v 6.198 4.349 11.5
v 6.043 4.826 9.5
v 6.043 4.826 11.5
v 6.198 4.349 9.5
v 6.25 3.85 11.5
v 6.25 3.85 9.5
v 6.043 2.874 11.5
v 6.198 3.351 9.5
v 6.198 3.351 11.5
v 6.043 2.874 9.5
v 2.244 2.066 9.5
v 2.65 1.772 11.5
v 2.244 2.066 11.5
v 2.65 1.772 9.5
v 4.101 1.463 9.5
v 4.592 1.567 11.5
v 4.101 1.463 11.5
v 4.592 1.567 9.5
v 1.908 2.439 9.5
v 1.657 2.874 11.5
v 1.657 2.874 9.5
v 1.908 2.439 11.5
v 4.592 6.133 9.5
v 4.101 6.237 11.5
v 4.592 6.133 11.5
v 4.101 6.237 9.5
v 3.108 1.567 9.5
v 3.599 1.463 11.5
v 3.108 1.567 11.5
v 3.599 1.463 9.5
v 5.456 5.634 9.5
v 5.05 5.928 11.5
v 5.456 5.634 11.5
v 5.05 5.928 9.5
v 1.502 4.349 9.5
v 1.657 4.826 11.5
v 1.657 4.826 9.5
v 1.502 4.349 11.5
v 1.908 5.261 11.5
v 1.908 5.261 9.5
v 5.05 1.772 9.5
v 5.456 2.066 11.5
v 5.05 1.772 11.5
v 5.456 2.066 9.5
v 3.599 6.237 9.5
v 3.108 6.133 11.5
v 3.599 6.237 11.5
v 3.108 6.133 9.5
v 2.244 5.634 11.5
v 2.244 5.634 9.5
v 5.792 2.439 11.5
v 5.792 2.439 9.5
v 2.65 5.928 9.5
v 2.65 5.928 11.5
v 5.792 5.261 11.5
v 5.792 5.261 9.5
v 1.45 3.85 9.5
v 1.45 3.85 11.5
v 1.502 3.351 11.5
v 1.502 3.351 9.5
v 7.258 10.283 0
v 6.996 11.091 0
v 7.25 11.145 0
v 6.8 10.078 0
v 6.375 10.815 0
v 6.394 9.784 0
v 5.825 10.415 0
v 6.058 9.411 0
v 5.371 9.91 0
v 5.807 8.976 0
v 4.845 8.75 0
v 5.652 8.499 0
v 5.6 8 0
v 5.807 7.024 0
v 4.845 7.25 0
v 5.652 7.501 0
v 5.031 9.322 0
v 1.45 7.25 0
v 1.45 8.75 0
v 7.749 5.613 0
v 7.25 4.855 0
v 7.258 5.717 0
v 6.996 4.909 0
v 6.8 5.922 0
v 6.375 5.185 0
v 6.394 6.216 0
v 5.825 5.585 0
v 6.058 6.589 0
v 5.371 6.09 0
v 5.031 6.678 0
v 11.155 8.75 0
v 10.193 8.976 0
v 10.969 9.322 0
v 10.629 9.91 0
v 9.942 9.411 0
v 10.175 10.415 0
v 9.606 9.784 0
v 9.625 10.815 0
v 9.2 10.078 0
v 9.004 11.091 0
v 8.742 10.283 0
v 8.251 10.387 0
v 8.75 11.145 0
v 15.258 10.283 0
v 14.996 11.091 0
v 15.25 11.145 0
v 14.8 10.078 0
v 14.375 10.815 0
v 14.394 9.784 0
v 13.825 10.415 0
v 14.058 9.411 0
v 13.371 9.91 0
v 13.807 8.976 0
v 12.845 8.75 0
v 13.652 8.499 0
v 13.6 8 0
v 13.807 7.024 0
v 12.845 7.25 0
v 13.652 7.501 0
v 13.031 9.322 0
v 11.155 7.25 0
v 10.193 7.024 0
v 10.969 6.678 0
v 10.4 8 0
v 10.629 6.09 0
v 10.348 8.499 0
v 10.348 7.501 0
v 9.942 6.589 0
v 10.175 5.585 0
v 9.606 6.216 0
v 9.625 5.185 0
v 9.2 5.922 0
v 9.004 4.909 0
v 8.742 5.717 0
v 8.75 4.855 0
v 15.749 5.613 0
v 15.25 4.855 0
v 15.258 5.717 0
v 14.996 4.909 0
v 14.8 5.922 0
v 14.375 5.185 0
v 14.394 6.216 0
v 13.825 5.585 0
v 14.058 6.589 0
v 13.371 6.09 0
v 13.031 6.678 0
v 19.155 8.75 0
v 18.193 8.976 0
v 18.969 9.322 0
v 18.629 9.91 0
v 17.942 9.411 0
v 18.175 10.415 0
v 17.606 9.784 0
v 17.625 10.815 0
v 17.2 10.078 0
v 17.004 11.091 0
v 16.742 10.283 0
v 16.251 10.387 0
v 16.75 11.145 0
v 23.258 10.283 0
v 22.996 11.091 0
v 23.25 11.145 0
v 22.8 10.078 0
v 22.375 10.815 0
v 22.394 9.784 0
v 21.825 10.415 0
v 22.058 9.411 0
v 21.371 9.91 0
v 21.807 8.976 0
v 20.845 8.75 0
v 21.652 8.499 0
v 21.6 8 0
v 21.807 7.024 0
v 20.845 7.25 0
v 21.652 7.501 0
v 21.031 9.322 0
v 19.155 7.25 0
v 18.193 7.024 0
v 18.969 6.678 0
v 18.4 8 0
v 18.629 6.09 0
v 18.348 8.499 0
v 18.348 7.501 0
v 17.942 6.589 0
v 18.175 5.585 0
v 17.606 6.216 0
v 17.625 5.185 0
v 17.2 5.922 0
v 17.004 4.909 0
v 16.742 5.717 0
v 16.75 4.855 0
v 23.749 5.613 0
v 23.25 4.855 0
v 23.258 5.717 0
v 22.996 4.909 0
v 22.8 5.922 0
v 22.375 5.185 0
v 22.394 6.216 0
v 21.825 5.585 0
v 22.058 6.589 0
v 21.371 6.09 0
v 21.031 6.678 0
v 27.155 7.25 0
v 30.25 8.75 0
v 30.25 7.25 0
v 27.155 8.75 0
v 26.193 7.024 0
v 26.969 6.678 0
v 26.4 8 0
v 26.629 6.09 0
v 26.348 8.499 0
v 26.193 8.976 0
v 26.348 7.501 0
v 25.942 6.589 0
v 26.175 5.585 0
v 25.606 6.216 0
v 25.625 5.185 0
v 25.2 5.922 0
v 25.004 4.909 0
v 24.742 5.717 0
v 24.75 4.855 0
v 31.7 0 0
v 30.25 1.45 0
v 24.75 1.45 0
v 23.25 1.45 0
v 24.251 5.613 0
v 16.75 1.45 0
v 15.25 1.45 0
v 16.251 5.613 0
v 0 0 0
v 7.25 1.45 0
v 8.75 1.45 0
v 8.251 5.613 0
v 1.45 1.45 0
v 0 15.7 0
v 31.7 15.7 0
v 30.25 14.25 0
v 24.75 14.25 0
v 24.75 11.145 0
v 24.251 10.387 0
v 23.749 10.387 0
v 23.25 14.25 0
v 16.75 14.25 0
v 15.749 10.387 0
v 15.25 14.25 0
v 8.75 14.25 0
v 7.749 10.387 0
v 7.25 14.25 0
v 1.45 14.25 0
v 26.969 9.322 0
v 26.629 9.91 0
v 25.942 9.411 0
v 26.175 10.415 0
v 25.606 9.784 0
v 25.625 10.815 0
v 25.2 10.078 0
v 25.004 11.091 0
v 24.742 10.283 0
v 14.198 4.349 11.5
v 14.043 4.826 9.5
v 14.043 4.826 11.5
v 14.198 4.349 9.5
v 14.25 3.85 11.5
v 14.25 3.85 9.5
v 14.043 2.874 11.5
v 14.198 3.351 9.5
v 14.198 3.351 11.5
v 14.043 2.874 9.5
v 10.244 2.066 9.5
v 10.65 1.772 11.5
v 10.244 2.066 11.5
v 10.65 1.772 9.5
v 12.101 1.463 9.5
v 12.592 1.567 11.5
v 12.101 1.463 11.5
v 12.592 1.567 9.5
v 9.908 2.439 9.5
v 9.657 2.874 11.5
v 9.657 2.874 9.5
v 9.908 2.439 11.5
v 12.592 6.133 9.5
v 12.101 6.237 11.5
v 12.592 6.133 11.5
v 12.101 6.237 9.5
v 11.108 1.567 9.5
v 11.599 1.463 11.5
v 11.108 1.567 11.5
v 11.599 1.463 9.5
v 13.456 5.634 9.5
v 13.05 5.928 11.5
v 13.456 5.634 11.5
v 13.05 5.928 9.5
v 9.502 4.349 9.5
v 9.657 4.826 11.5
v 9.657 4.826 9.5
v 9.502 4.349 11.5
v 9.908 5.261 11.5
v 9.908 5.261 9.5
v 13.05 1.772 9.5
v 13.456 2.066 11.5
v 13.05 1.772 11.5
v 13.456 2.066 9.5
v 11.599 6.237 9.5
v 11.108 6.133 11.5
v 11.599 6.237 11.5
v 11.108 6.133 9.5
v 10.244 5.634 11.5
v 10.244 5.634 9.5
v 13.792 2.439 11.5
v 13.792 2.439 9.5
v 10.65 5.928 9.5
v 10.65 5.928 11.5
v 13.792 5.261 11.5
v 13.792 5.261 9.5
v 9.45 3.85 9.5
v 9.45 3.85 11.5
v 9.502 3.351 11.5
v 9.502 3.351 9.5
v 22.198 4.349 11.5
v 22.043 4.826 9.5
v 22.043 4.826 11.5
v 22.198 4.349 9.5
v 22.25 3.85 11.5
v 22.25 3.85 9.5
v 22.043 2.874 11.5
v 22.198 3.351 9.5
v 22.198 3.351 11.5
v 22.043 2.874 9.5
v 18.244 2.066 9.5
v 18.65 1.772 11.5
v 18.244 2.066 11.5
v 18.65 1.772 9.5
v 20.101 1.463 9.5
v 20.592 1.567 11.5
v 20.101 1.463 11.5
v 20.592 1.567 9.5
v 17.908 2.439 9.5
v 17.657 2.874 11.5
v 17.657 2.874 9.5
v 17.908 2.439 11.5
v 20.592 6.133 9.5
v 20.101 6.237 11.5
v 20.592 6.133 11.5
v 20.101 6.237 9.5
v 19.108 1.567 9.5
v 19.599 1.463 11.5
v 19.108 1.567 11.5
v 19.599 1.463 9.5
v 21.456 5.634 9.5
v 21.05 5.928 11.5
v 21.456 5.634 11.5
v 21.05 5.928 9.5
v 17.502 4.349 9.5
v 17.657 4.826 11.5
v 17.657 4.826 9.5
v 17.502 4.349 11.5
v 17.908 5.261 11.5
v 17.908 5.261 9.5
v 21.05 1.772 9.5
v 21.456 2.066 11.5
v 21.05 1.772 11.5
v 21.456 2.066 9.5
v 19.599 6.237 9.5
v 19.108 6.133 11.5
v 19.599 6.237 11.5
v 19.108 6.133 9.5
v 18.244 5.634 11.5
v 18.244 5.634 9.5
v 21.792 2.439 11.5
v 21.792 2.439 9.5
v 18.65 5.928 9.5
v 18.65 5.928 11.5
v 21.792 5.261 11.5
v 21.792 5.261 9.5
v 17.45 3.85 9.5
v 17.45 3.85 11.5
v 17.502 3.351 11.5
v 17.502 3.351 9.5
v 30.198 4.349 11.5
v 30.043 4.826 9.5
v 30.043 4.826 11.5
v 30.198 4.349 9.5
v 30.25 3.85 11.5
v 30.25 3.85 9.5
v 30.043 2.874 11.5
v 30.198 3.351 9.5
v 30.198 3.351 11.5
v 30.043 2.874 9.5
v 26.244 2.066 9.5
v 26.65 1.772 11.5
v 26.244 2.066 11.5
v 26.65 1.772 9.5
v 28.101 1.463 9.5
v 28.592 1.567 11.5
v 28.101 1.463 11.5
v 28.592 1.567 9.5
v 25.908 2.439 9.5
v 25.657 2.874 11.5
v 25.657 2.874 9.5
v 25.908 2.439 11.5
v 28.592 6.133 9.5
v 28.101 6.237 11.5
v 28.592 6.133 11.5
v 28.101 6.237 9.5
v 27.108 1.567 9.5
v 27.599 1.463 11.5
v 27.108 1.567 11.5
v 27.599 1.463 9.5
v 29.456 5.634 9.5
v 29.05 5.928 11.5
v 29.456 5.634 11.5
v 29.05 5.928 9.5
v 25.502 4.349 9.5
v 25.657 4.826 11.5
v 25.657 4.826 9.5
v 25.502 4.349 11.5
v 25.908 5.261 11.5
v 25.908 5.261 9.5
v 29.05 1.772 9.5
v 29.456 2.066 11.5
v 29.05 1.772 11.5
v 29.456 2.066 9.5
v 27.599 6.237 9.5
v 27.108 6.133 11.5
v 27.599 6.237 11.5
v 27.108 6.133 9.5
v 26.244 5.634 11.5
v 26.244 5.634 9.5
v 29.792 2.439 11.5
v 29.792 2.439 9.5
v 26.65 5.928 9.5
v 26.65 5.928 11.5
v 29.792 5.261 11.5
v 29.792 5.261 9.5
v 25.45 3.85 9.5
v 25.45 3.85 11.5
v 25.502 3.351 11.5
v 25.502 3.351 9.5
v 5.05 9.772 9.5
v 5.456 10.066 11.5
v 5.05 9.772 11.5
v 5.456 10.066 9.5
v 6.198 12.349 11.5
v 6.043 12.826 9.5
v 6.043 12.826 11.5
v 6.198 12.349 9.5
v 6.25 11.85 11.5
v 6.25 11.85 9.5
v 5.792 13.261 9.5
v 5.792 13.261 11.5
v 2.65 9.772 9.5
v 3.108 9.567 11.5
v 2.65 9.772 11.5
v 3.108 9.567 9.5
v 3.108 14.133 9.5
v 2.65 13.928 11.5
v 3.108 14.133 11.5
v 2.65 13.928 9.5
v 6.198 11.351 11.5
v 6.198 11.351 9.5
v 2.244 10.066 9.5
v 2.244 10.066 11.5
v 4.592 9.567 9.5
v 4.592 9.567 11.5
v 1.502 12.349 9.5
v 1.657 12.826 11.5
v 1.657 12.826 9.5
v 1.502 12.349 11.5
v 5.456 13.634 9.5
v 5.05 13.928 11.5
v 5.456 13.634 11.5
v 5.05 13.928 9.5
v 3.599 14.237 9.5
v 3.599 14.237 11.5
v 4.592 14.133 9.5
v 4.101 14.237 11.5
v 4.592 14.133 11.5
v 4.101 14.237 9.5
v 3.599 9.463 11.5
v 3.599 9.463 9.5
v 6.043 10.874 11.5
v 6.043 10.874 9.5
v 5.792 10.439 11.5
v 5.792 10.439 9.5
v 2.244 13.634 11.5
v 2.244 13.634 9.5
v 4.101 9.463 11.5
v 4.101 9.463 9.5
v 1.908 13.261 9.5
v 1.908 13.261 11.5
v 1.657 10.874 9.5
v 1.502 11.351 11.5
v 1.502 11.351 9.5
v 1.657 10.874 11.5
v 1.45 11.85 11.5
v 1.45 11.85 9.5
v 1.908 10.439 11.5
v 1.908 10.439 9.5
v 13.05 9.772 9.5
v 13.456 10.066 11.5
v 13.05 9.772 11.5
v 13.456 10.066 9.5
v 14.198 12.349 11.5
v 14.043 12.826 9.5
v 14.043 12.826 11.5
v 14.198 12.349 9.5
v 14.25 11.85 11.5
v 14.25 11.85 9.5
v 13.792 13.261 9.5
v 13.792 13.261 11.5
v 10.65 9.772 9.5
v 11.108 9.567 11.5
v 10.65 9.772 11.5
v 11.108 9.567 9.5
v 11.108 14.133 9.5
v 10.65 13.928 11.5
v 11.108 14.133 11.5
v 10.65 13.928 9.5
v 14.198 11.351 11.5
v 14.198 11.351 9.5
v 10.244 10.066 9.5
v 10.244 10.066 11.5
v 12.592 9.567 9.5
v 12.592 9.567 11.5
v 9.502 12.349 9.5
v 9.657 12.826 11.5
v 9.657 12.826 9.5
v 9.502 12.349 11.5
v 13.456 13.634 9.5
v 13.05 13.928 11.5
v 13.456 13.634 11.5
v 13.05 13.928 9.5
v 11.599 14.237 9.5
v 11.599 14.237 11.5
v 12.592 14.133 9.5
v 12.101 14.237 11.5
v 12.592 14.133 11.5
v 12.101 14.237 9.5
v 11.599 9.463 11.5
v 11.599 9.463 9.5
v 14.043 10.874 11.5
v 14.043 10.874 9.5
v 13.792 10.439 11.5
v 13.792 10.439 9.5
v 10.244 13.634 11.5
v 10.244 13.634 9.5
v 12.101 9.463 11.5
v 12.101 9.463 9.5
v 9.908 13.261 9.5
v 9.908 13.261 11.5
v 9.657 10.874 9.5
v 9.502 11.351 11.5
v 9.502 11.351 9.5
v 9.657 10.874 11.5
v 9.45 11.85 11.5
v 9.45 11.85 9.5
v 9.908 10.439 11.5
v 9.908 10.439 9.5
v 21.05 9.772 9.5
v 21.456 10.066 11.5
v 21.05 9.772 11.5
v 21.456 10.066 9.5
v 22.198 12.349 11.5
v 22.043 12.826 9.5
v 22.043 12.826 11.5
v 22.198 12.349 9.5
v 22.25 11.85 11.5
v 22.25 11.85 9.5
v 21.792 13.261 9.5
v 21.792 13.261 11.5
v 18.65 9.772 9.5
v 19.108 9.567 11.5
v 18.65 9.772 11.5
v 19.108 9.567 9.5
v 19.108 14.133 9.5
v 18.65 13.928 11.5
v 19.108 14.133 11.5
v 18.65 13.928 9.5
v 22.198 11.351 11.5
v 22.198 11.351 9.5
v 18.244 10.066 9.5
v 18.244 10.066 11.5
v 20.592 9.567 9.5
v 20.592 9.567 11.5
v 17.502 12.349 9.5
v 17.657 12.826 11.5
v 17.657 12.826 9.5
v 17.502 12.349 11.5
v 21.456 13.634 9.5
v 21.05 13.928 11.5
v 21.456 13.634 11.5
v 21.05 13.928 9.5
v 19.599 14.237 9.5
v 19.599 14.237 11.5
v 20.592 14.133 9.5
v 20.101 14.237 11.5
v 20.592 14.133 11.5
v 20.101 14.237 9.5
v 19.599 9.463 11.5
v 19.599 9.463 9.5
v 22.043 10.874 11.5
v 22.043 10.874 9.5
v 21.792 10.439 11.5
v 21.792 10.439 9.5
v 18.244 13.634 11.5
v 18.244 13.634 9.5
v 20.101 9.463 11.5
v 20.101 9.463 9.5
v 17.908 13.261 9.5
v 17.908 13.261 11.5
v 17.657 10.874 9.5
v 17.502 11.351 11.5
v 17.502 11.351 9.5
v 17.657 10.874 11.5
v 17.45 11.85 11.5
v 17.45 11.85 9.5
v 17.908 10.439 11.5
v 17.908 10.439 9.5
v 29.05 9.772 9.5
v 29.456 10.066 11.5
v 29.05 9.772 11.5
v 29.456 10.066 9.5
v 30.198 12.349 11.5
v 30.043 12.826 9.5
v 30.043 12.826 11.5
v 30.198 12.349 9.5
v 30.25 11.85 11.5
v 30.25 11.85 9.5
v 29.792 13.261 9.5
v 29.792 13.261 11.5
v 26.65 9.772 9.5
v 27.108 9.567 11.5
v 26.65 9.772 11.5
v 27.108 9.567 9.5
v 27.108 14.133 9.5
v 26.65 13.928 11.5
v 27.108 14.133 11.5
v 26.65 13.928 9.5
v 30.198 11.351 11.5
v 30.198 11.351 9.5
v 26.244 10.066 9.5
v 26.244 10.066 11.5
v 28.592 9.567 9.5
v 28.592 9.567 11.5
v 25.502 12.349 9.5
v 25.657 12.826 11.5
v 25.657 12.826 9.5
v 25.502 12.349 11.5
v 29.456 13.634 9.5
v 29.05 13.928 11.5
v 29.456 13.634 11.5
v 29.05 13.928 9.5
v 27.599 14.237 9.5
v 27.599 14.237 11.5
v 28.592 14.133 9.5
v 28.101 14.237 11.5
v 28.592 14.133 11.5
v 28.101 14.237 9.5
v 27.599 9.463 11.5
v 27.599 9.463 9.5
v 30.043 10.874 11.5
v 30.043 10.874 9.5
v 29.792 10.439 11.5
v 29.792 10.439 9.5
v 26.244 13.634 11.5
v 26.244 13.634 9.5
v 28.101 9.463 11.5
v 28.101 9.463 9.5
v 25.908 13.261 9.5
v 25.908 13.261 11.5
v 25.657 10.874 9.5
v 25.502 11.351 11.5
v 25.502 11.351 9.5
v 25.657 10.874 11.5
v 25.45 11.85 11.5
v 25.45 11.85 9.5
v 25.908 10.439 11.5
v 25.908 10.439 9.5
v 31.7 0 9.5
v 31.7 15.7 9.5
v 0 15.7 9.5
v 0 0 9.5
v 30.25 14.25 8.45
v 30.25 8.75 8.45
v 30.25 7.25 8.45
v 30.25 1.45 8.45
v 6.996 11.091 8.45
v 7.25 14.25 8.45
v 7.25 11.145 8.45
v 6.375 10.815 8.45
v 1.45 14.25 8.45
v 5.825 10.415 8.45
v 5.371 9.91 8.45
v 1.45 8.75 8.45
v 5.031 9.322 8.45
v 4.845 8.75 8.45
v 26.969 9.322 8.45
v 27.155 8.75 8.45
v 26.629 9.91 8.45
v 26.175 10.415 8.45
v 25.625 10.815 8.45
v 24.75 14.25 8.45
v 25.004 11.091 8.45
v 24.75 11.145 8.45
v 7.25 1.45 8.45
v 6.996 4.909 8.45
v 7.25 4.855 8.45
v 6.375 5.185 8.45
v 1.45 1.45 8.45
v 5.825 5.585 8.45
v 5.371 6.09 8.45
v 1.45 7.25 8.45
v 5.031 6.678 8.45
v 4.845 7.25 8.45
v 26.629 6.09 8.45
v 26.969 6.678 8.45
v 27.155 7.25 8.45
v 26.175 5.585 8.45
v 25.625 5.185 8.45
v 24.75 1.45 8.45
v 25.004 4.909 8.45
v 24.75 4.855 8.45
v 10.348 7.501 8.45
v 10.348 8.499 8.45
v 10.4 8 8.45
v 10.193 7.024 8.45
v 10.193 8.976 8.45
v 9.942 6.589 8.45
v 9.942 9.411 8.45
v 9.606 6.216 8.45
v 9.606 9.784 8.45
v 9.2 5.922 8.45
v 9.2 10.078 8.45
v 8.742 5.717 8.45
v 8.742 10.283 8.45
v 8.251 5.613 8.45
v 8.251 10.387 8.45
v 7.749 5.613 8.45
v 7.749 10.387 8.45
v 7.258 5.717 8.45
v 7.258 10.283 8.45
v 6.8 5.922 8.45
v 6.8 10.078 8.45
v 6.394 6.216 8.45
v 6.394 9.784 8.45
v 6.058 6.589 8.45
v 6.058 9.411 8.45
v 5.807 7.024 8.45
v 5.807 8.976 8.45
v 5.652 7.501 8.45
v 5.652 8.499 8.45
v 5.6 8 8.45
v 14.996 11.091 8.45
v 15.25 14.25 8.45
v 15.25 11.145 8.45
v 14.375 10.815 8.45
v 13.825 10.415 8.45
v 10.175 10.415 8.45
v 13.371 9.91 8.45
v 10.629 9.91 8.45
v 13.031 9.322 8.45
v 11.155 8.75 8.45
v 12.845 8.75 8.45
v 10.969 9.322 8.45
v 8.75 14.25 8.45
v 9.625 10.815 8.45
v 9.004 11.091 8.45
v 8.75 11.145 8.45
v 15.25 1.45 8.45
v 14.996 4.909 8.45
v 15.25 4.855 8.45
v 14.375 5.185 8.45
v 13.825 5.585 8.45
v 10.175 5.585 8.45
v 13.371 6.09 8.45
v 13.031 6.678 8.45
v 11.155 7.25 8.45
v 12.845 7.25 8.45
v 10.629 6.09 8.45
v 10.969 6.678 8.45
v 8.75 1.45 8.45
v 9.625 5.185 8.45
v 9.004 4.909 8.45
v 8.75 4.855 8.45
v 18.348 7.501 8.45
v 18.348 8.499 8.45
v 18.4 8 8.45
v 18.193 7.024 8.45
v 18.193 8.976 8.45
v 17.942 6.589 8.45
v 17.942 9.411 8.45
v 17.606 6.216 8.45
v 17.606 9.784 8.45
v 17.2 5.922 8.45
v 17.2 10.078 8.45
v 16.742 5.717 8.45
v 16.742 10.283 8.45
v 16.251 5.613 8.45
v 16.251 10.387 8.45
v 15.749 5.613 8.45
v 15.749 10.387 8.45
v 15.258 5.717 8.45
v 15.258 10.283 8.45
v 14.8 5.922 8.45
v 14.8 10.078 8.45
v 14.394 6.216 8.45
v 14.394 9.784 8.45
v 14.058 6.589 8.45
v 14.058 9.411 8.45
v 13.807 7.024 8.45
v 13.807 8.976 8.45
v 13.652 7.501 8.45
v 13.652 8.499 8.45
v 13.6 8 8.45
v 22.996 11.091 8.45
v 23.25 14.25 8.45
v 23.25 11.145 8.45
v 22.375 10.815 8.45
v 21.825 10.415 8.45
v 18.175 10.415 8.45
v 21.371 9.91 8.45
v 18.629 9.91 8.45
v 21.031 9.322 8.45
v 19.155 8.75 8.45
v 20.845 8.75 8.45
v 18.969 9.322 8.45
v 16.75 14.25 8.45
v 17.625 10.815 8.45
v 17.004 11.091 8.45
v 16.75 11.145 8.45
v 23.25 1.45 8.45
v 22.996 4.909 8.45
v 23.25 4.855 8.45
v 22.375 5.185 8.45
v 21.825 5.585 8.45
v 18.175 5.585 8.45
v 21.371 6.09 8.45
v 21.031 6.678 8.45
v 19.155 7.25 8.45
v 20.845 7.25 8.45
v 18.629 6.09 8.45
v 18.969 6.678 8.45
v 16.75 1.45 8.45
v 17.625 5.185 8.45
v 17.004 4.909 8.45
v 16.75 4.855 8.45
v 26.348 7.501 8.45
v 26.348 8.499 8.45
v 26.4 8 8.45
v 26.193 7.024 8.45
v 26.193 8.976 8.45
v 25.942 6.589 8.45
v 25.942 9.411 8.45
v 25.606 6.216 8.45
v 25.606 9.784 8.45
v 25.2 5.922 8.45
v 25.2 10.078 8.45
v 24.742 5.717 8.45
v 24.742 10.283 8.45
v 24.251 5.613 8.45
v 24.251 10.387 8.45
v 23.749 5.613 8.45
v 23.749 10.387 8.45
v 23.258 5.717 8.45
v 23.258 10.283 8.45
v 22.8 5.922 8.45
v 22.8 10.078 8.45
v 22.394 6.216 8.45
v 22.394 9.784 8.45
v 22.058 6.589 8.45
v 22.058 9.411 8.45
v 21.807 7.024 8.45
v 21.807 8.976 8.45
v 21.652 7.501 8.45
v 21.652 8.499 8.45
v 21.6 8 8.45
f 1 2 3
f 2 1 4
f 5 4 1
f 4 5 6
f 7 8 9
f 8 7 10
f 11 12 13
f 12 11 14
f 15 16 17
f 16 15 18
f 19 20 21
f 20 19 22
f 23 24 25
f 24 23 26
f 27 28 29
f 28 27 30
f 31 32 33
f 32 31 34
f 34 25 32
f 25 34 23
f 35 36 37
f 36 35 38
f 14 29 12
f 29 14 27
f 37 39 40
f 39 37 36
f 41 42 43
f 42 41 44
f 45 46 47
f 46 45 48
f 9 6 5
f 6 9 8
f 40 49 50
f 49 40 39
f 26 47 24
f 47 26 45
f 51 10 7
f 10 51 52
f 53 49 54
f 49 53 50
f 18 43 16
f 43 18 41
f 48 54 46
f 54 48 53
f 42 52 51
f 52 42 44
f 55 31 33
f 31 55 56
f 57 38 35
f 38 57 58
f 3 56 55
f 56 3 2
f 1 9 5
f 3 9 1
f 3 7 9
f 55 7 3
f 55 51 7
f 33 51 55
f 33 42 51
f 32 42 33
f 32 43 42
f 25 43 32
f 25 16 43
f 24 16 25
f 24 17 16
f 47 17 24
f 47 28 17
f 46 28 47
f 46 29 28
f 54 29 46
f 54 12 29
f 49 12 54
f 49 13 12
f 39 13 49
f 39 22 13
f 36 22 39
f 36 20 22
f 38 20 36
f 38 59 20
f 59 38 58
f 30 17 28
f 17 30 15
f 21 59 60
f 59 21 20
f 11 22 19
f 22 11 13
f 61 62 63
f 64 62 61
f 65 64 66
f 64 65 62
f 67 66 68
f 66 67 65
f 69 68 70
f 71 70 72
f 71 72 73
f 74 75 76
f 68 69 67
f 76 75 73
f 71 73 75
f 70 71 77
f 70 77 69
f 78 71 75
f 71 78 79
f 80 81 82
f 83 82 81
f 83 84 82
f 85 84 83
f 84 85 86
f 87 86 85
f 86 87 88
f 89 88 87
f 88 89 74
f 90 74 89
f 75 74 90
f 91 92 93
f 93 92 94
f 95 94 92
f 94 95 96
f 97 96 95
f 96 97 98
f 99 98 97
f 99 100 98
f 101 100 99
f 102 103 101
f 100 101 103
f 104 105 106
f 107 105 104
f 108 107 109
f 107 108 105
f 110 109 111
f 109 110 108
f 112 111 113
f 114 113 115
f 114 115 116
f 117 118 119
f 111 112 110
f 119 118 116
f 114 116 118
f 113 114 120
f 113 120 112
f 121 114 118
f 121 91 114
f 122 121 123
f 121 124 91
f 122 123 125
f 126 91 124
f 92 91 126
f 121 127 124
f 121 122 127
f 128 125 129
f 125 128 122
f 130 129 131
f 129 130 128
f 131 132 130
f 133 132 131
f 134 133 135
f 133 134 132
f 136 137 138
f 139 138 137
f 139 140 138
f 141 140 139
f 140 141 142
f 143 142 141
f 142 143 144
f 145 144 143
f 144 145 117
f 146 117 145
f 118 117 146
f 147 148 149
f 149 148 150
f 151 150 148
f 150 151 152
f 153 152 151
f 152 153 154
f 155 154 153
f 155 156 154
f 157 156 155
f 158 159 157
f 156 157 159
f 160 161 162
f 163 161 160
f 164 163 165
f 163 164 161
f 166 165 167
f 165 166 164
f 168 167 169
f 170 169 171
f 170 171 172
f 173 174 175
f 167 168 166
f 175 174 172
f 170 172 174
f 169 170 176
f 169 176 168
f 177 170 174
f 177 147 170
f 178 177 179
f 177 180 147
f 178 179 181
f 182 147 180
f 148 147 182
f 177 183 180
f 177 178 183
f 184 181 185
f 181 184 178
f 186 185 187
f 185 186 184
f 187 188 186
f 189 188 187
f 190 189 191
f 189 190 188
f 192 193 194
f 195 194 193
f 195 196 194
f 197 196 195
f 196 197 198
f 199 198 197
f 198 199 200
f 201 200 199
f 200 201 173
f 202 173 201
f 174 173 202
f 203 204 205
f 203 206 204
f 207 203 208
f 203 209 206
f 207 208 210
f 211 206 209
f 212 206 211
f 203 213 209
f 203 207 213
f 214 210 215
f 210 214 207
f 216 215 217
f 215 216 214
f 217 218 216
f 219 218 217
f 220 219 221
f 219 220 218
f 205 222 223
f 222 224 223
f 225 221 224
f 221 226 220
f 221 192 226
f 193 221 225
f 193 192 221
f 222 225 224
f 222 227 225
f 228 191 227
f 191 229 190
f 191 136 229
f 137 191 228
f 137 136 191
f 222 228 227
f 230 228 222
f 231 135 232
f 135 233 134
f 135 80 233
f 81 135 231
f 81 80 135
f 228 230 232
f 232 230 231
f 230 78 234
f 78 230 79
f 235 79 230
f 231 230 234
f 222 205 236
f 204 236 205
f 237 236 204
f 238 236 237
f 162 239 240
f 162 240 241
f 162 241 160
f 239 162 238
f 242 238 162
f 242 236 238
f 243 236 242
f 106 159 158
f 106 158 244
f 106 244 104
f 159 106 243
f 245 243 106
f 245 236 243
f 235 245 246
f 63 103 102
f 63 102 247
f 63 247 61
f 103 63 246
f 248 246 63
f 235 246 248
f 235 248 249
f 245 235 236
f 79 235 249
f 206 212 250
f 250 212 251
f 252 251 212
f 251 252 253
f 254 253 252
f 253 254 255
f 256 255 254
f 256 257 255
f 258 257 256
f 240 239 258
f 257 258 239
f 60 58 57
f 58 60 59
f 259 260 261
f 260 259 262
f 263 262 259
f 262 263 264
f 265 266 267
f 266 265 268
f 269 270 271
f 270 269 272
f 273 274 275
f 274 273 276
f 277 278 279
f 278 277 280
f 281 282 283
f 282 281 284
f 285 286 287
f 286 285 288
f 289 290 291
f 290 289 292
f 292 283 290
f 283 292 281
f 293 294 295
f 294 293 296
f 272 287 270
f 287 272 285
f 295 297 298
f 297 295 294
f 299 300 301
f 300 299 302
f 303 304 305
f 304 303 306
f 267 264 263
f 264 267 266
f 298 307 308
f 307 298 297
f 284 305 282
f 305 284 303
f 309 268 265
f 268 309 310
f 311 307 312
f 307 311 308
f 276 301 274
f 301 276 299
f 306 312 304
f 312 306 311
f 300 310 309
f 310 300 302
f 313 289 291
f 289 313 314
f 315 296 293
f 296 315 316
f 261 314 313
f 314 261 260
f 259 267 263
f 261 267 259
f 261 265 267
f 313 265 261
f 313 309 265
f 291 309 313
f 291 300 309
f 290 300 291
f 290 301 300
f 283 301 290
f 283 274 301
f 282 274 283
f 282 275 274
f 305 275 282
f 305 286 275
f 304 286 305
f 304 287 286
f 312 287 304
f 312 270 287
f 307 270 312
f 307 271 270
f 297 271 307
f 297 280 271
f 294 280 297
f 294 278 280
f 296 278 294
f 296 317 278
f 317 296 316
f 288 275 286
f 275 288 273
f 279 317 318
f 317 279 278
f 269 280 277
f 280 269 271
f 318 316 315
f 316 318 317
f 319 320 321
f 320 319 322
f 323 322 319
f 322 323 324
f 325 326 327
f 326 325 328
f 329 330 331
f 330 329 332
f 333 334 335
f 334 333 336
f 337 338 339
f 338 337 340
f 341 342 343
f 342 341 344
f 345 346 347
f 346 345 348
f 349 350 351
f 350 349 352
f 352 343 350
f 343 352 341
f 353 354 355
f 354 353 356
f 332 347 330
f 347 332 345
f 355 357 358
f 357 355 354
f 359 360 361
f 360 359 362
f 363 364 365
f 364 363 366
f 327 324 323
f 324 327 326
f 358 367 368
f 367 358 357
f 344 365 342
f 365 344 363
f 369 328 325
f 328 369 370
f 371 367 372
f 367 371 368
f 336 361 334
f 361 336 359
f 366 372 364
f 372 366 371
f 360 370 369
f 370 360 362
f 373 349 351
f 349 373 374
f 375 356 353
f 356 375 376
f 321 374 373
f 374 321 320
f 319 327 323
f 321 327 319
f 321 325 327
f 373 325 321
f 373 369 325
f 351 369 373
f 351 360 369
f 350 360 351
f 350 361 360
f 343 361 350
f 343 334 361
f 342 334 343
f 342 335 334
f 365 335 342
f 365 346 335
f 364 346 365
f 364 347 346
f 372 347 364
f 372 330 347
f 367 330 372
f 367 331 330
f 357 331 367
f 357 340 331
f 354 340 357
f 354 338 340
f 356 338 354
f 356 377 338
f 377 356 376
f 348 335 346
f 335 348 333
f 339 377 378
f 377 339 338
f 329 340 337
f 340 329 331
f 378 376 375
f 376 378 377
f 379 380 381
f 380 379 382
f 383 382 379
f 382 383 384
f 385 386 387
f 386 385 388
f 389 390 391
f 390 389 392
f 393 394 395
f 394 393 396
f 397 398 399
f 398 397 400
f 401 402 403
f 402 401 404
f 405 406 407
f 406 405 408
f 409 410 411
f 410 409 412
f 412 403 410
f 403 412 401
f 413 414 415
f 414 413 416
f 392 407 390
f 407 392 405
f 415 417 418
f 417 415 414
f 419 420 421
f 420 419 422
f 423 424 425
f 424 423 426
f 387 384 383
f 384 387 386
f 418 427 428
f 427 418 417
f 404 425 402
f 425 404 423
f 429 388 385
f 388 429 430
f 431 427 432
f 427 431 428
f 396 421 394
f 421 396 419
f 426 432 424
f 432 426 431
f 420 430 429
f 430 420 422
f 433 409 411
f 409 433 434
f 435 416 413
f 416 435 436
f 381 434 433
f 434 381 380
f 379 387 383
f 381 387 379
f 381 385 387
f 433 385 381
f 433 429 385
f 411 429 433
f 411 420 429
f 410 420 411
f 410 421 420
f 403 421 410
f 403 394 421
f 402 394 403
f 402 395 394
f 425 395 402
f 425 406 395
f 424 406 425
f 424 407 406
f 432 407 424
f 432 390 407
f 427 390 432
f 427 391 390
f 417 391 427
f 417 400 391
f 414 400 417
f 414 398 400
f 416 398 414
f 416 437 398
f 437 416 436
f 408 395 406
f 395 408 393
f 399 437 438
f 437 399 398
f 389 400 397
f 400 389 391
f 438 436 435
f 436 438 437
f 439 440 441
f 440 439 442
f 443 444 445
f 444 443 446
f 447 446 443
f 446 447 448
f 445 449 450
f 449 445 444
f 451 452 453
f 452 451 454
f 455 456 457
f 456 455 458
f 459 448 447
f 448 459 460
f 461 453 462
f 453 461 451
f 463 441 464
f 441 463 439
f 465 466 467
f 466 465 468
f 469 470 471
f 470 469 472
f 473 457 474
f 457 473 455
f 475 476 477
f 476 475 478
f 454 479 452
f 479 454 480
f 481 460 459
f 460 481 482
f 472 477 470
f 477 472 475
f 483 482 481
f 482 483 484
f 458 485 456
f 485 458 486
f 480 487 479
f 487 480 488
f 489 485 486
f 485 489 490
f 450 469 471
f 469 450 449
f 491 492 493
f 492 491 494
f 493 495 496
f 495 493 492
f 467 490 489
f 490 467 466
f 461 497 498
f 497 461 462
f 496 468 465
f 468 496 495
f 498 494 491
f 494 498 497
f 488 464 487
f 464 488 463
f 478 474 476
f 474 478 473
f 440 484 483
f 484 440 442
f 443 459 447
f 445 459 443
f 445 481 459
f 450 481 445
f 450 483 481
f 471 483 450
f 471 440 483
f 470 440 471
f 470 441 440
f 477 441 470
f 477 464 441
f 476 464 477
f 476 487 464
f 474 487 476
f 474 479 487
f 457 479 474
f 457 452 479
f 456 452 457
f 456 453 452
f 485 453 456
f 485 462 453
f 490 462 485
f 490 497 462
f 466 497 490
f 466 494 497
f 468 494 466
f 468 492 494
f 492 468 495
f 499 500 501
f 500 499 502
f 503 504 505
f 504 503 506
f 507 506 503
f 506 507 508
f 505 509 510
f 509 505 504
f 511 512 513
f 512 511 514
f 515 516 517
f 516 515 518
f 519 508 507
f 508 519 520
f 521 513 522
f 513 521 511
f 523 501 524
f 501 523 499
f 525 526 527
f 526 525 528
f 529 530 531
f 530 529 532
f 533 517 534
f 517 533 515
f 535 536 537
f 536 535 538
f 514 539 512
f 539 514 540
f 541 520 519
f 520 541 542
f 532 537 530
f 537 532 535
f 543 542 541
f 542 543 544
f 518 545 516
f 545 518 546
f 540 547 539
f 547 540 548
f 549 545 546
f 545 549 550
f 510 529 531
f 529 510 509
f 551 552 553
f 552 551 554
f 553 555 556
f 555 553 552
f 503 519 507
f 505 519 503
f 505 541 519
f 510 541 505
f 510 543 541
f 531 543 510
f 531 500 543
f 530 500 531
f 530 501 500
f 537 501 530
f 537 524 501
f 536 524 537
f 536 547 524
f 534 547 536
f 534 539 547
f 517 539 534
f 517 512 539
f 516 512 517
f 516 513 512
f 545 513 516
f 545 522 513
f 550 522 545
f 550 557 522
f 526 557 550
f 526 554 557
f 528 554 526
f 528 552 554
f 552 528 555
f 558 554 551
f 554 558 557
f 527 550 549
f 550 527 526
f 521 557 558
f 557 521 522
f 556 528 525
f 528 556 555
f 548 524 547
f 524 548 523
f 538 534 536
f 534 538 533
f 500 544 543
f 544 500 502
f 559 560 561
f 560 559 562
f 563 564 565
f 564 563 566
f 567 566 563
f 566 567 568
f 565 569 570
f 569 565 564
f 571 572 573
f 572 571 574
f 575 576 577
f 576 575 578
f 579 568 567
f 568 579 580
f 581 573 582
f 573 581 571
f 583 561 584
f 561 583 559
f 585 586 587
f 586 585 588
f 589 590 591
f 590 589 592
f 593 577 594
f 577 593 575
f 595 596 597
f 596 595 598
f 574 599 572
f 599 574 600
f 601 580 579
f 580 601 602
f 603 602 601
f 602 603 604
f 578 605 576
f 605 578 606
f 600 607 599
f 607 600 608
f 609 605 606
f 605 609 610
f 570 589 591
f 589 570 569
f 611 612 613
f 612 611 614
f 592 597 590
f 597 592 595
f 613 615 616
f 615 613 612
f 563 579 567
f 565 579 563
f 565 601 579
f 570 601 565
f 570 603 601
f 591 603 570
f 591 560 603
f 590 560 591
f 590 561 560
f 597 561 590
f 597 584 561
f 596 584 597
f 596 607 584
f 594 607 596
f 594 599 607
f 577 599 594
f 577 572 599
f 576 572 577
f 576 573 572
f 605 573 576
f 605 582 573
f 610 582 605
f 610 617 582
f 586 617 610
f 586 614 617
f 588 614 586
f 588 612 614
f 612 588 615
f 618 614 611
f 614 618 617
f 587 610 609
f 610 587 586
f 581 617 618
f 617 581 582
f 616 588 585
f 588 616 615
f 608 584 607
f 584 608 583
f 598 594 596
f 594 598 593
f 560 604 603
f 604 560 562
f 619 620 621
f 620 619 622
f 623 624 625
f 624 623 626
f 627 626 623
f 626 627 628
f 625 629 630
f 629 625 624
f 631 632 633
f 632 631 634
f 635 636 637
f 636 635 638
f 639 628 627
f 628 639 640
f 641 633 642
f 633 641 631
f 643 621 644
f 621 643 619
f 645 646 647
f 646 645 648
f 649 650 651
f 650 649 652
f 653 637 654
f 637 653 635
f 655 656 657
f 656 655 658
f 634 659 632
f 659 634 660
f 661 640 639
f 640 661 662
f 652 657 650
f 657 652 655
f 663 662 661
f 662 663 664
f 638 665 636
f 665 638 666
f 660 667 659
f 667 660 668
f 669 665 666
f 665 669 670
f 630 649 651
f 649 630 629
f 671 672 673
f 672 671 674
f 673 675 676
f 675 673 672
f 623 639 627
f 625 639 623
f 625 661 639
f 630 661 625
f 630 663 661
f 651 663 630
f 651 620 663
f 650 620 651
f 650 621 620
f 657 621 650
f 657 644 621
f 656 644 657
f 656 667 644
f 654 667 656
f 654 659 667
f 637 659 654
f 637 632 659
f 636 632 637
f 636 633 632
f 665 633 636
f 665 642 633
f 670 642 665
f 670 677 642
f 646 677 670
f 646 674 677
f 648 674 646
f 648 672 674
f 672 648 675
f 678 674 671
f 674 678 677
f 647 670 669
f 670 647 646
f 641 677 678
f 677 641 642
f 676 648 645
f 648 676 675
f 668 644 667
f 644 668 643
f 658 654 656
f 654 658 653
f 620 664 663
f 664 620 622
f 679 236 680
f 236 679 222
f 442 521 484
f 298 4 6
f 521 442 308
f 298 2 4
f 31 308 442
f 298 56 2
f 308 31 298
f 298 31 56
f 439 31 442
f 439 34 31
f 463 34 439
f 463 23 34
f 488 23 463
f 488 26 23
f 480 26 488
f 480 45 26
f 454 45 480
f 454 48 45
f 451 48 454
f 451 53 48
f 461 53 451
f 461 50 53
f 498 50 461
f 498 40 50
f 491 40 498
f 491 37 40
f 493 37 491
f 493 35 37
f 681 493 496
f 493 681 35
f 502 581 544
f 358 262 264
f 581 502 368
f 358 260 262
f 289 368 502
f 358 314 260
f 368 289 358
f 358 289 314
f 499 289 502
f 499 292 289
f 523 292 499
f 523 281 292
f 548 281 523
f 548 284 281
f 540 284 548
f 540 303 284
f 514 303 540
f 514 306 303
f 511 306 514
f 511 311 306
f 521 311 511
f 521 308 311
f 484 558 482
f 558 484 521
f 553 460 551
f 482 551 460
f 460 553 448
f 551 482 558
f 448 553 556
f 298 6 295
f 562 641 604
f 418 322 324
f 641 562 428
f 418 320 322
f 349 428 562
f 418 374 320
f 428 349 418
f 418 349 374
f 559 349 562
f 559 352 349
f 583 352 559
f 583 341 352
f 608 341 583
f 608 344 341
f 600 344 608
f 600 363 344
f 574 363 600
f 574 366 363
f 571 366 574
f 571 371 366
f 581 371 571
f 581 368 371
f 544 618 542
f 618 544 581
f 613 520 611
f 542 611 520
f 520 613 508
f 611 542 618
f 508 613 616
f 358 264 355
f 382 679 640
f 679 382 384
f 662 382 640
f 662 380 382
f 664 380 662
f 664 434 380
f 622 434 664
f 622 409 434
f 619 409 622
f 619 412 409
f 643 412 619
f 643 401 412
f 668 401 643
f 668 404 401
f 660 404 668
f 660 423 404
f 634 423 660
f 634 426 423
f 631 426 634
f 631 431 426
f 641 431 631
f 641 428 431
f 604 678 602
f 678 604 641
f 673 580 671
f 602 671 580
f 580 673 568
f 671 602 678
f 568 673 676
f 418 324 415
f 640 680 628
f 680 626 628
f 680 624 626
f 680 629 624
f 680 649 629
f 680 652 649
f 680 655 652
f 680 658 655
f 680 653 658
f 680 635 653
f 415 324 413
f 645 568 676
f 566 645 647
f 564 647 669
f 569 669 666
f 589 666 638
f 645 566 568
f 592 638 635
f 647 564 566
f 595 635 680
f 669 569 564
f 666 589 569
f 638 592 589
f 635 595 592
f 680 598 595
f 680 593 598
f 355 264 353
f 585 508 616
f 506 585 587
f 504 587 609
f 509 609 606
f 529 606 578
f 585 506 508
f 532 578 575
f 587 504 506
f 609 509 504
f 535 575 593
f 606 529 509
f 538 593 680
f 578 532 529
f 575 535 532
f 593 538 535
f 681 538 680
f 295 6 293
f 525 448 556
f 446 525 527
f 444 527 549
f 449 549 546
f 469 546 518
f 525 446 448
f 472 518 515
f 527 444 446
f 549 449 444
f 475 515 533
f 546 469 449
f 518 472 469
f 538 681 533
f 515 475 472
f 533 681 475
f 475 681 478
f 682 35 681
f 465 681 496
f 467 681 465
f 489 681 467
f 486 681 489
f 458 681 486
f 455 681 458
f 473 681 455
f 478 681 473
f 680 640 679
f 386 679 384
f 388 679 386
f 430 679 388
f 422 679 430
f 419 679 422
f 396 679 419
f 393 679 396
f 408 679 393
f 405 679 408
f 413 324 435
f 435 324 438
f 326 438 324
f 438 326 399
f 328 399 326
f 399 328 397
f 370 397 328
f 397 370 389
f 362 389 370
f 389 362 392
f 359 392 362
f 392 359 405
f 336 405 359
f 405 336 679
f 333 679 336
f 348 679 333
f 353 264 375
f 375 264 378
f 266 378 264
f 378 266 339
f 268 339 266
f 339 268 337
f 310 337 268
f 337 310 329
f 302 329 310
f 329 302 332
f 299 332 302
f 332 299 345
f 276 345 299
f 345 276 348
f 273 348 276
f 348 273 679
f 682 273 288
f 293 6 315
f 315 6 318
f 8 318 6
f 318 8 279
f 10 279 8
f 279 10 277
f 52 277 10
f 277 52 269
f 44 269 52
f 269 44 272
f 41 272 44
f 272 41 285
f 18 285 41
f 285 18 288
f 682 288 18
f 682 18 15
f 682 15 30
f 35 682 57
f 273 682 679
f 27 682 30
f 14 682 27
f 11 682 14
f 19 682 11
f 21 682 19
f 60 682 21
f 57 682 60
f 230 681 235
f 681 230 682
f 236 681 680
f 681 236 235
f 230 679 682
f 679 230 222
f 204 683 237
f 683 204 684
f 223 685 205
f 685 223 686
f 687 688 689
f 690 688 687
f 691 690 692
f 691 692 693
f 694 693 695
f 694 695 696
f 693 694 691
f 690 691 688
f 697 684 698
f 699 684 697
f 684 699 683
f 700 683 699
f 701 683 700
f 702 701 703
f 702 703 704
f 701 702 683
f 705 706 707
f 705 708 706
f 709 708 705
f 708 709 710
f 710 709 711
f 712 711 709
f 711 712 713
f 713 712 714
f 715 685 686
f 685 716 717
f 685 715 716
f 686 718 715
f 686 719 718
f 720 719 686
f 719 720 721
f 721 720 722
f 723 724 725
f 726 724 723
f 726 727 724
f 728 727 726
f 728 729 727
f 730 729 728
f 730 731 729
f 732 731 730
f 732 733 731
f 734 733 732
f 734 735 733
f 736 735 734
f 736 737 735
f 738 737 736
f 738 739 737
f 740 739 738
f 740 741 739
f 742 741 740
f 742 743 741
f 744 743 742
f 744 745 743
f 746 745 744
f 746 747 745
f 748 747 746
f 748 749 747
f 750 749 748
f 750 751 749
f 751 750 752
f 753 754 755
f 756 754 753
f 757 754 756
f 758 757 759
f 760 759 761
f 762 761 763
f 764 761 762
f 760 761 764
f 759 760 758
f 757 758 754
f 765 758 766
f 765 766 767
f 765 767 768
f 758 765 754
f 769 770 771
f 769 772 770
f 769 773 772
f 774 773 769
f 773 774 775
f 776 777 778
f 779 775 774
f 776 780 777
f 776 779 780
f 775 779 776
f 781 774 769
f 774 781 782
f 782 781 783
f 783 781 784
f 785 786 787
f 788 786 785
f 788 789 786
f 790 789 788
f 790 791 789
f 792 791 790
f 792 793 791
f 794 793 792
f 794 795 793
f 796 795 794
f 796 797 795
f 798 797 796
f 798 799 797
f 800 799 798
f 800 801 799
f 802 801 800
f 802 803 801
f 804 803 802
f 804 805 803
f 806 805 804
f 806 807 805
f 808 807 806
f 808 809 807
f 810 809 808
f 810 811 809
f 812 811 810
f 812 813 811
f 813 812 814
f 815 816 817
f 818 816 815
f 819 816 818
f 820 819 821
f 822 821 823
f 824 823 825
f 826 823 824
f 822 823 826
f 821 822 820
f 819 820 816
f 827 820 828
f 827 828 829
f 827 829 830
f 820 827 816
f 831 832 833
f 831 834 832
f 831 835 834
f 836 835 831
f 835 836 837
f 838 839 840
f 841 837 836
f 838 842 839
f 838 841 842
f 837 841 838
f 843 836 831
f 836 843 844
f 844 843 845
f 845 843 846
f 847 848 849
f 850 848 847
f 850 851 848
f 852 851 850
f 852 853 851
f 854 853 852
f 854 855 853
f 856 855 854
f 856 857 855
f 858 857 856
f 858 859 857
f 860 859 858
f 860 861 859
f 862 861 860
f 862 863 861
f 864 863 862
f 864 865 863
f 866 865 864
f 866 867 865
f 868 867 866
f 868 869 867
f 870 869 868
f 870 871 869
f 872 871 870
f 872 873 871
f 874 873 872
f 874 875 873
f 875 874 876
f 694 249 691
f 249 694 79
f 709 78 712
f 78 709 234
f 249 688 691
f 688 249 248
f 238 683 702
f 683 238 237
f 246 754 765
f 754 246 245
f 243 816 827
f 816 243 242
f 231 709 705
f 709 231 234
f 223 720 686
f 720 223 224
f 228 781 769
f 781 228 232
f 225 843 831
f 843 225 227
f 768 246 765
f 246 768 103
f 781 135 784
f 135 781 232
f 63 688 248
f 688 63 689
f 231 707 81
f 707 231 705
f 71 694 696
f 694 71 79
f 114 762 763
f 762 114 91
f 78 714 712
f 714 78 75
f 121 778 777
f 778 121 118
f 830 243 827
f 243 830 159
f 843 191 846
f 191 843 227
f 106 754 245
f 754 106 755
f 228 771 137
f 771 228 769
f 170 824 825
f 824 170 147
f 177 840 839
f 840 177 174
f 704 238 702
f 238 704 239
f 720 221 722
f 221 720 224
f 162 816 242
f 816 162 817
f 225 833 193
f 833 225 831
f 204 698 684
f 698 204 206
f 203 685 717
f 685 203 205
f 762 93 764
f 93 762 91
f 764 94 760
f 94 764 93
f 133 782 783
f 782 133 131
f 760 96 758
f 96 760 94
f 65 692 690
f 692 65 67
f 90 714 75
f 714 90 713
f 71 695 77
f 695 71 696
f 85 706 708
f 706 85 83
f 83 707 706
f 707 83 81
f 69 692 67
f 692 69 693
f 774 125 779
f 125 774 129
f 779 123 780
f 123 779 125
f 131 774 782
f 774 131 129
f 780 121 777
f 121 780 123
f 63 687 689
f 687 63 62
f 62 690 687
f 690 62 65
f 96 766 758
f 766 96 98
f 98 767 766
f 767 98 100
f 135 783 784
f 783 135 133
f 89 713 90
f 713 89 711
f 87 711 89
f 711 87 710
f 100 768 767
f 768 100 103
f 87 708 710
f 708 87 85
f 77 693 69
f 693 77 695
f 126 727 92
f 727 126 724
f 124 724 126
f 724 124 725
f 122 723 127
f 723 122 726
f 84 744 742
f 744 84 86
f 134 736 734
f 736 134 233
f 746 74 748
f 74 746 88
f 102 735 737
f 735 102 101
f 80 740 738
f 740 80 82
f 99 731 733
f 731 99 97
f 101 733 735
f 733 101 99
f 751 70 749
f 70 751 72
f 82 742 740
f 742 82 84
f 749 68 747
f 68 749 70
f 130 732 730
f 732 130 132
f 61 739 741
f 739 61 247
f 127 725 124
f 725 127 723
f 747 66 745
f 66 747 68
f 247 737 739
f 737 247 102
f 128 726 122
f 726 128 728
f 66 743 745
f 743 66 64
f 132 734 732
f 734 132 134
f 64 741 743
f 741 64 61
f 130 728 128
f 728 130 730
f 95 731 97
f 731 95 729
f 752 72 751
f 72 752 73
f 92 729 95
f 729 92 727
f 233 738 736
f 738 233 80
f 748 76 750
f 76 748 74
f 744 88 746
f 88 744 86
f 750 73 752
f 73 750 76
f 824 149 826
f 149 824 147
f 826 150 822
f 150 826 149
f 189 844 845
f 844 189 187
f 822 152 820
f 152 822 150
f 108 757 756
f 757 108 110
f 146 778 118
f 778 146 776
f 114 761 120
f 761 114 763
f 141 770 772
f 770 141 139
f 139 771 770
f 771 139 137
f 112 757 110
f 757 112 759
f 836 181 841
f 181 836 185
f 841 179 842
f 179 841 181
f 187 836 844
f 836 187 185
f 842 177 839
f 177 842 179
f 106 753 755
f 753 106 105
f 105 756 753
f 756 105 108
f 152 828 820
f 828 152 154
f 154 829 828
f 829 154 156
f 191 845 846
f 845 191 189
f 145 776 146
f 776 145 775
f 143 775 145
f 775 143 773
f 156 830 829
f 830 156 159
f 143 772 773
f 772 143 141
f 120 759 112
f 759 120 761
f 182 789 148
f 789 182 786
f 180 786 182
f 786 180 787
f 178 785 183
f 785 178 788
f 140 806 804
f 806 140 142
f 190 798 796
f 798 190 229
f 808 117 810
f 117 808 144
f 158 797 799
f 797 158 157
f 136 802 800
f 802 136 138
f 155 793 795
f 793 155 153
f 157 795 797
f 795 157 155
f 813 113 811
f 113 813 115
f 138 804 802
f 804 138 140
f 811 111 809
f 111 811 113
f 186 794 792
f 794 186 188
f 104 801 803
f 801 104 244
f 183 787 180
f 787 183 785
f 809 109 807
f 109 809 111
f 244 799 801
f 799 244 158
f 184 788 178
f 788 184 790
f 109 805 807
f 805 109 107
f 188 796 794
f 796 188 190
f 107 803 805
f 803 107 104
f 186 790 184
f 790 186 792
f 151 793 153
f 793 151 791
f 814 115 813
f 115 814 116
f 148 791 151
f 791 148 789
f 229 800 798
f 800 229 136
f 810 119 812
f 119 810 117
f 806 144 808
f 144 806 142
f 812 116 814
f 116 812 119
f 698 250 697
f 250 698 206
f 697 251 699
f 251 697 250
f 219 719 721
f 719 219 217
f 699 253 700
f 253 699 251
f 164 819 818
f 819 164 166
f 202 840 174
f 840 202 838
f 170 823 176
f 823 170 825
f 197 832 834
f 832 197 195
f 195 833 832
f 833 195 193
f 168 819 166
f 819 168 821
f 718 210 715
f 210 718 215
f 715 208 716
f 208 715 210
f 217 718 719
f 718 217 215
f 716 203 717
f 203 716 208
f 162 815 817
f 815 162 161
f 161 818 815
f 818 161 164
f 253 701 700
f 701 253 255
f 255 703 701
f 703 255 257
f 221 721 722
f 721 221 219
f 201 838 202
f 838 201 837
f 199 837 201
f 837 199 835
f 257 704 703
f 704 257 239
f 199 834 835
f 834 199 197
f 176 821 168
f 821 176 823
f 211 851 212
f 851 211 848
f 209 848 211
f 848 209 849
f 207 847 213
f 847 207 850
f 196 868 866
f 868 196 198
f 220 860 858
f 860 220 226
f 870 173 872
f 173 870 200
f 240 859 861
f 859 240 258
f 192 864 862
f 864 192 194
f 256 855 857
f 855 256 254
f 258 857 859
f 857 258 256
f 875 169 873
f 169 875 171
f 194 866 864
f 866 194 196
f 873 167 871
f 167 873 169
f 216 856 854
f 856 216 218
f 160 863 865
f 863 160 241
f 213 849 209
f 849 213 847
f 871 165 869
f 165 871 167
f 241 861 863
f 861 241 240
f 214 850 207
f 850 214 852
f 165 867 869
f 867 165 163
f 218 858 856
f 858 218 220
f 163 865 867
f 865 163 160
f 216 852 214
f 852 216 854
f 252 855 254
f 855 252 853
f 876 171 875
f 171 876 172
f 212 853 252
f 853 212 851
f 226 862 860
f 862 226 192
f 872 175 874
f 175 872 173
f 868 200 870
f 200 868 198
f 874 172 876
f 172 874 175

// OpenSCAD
//Edited 2/14/2013
//Based off of jag's design
//Adapted by Adam Zeloof (azzeloof)


Block_Width = 4;

Block_Length = 2; 

Block_Height = 1;

// knob_diameter=4.8;		//knobs on top of blocks
// knob_height=2;
// knob_spacing=8.0;
// wall_thickness=1.45;
// roof_thickness=1.05;
// block_height=9.5;
// pin_diameter=3;		//pin for bottom blocks with width or length of 1
// post_diameter=6.5;
// reinforcing_width=1.5;
// axle_spline_width=2.0;
// axle_diameter=9.5;


block(Block_Length,Block_Width,Block_Height,axle_hole=false,reinforcement=true);

module block(width,length,height,axle_hole,reinforcement) {
	overall_length=(length-1)*8+4.8+1.45*2;
	overall_width=(width-1)*8+4.8+1.45*2;
	union() {
		difference() {
			union() {
				cube([overall_length,overall_width,height*9.5]);
				translate([4.8/2+1.45,4.8/2+1.45,0]) 
					for (ycount=[0:width-1])
						for (xcount=[0:length-1]) {
							translate([xcount*8,ycount*8,0])
								cylinder(r=4.8/2,h=9.5*height+2,$fs=.1);
					}
			}
			translate([1.45,1.45,-1.05]) cube([overall_length-1.45*2,overall_width-1.45*2,9.5*height]);
			if (axle_hole==true)
				if (width>1 && length>1) for (ycount=[1:width-1])
					for (xcount=[1:length-1])
						translate([xcount*8,ycount*8,-9.5/2])  axle(height+1);
		}

		if (reinforcement==true && width>1 && length>1)
			difference() {
				for (ycount=[1:width-1])
					for (xcount=[1:length-1])
						translate([xcount*8,ycount*8,0]) reinforcement(height);
				for (ycount=[1:width-1])
					for (xcount=[1:length-1])
						translate([xcount*8,ycount*8,-0.5]) cylinder(r=6.5/2-0.1, h=height*9.5+0.5, $fs=.1);
			}

		if (width>1 && length>1) for (ycount=[1:width-1])
			for (xcount=[1:length-1])
				translate([xcount*8,ycount*8,0]) post(height,axle_hole);

		if (width==1 && length!=1)
			for (xcount=[1:length-1])
				translate([xcount*8,overall_width/2,0]) cylinder(r=3/2,h=9.5*height,$fs=.1);

		if (length==1 && width!=1)
			for (ycount=[1:width-1])
				translate([overall_length/2,ycount*8,0]) cylinder(r=3/2,h=9.5*height,$fs=.1);
	}
}

module post(height,axle_hole=false) {
	difference() {
		cylinder(r=6.5/2, h=height*9.5,$fs=.1);
		if (axle_hole==true) {
			translate([0,0,-block_height/2])
				axle(height+1);
		} else {
			translate([0,0,-0.5])
				cylinder(r=4.8/2, h=height*9.5+1,$fs=.1);
		}
	}
}

module reinforcement(height) {
	union() {
		translate([0,0,height*9.5/2]) union() {
			cube([1.5,8+4.8+1.45/2,height*9.5],center=true);
			rotate(v=[0,0,1],a=90) cube([1.5,8+4.8+1.45/2,height*9.5], center=true);
		}
	}
}

module axle(height) {
	translate([0,0,height*9.5/2]) union() {
		cube([9.5,2.0,height*9.5],center=true);
		cube([2.0,9.5,height*9.5],center=true);
	}
}
			
